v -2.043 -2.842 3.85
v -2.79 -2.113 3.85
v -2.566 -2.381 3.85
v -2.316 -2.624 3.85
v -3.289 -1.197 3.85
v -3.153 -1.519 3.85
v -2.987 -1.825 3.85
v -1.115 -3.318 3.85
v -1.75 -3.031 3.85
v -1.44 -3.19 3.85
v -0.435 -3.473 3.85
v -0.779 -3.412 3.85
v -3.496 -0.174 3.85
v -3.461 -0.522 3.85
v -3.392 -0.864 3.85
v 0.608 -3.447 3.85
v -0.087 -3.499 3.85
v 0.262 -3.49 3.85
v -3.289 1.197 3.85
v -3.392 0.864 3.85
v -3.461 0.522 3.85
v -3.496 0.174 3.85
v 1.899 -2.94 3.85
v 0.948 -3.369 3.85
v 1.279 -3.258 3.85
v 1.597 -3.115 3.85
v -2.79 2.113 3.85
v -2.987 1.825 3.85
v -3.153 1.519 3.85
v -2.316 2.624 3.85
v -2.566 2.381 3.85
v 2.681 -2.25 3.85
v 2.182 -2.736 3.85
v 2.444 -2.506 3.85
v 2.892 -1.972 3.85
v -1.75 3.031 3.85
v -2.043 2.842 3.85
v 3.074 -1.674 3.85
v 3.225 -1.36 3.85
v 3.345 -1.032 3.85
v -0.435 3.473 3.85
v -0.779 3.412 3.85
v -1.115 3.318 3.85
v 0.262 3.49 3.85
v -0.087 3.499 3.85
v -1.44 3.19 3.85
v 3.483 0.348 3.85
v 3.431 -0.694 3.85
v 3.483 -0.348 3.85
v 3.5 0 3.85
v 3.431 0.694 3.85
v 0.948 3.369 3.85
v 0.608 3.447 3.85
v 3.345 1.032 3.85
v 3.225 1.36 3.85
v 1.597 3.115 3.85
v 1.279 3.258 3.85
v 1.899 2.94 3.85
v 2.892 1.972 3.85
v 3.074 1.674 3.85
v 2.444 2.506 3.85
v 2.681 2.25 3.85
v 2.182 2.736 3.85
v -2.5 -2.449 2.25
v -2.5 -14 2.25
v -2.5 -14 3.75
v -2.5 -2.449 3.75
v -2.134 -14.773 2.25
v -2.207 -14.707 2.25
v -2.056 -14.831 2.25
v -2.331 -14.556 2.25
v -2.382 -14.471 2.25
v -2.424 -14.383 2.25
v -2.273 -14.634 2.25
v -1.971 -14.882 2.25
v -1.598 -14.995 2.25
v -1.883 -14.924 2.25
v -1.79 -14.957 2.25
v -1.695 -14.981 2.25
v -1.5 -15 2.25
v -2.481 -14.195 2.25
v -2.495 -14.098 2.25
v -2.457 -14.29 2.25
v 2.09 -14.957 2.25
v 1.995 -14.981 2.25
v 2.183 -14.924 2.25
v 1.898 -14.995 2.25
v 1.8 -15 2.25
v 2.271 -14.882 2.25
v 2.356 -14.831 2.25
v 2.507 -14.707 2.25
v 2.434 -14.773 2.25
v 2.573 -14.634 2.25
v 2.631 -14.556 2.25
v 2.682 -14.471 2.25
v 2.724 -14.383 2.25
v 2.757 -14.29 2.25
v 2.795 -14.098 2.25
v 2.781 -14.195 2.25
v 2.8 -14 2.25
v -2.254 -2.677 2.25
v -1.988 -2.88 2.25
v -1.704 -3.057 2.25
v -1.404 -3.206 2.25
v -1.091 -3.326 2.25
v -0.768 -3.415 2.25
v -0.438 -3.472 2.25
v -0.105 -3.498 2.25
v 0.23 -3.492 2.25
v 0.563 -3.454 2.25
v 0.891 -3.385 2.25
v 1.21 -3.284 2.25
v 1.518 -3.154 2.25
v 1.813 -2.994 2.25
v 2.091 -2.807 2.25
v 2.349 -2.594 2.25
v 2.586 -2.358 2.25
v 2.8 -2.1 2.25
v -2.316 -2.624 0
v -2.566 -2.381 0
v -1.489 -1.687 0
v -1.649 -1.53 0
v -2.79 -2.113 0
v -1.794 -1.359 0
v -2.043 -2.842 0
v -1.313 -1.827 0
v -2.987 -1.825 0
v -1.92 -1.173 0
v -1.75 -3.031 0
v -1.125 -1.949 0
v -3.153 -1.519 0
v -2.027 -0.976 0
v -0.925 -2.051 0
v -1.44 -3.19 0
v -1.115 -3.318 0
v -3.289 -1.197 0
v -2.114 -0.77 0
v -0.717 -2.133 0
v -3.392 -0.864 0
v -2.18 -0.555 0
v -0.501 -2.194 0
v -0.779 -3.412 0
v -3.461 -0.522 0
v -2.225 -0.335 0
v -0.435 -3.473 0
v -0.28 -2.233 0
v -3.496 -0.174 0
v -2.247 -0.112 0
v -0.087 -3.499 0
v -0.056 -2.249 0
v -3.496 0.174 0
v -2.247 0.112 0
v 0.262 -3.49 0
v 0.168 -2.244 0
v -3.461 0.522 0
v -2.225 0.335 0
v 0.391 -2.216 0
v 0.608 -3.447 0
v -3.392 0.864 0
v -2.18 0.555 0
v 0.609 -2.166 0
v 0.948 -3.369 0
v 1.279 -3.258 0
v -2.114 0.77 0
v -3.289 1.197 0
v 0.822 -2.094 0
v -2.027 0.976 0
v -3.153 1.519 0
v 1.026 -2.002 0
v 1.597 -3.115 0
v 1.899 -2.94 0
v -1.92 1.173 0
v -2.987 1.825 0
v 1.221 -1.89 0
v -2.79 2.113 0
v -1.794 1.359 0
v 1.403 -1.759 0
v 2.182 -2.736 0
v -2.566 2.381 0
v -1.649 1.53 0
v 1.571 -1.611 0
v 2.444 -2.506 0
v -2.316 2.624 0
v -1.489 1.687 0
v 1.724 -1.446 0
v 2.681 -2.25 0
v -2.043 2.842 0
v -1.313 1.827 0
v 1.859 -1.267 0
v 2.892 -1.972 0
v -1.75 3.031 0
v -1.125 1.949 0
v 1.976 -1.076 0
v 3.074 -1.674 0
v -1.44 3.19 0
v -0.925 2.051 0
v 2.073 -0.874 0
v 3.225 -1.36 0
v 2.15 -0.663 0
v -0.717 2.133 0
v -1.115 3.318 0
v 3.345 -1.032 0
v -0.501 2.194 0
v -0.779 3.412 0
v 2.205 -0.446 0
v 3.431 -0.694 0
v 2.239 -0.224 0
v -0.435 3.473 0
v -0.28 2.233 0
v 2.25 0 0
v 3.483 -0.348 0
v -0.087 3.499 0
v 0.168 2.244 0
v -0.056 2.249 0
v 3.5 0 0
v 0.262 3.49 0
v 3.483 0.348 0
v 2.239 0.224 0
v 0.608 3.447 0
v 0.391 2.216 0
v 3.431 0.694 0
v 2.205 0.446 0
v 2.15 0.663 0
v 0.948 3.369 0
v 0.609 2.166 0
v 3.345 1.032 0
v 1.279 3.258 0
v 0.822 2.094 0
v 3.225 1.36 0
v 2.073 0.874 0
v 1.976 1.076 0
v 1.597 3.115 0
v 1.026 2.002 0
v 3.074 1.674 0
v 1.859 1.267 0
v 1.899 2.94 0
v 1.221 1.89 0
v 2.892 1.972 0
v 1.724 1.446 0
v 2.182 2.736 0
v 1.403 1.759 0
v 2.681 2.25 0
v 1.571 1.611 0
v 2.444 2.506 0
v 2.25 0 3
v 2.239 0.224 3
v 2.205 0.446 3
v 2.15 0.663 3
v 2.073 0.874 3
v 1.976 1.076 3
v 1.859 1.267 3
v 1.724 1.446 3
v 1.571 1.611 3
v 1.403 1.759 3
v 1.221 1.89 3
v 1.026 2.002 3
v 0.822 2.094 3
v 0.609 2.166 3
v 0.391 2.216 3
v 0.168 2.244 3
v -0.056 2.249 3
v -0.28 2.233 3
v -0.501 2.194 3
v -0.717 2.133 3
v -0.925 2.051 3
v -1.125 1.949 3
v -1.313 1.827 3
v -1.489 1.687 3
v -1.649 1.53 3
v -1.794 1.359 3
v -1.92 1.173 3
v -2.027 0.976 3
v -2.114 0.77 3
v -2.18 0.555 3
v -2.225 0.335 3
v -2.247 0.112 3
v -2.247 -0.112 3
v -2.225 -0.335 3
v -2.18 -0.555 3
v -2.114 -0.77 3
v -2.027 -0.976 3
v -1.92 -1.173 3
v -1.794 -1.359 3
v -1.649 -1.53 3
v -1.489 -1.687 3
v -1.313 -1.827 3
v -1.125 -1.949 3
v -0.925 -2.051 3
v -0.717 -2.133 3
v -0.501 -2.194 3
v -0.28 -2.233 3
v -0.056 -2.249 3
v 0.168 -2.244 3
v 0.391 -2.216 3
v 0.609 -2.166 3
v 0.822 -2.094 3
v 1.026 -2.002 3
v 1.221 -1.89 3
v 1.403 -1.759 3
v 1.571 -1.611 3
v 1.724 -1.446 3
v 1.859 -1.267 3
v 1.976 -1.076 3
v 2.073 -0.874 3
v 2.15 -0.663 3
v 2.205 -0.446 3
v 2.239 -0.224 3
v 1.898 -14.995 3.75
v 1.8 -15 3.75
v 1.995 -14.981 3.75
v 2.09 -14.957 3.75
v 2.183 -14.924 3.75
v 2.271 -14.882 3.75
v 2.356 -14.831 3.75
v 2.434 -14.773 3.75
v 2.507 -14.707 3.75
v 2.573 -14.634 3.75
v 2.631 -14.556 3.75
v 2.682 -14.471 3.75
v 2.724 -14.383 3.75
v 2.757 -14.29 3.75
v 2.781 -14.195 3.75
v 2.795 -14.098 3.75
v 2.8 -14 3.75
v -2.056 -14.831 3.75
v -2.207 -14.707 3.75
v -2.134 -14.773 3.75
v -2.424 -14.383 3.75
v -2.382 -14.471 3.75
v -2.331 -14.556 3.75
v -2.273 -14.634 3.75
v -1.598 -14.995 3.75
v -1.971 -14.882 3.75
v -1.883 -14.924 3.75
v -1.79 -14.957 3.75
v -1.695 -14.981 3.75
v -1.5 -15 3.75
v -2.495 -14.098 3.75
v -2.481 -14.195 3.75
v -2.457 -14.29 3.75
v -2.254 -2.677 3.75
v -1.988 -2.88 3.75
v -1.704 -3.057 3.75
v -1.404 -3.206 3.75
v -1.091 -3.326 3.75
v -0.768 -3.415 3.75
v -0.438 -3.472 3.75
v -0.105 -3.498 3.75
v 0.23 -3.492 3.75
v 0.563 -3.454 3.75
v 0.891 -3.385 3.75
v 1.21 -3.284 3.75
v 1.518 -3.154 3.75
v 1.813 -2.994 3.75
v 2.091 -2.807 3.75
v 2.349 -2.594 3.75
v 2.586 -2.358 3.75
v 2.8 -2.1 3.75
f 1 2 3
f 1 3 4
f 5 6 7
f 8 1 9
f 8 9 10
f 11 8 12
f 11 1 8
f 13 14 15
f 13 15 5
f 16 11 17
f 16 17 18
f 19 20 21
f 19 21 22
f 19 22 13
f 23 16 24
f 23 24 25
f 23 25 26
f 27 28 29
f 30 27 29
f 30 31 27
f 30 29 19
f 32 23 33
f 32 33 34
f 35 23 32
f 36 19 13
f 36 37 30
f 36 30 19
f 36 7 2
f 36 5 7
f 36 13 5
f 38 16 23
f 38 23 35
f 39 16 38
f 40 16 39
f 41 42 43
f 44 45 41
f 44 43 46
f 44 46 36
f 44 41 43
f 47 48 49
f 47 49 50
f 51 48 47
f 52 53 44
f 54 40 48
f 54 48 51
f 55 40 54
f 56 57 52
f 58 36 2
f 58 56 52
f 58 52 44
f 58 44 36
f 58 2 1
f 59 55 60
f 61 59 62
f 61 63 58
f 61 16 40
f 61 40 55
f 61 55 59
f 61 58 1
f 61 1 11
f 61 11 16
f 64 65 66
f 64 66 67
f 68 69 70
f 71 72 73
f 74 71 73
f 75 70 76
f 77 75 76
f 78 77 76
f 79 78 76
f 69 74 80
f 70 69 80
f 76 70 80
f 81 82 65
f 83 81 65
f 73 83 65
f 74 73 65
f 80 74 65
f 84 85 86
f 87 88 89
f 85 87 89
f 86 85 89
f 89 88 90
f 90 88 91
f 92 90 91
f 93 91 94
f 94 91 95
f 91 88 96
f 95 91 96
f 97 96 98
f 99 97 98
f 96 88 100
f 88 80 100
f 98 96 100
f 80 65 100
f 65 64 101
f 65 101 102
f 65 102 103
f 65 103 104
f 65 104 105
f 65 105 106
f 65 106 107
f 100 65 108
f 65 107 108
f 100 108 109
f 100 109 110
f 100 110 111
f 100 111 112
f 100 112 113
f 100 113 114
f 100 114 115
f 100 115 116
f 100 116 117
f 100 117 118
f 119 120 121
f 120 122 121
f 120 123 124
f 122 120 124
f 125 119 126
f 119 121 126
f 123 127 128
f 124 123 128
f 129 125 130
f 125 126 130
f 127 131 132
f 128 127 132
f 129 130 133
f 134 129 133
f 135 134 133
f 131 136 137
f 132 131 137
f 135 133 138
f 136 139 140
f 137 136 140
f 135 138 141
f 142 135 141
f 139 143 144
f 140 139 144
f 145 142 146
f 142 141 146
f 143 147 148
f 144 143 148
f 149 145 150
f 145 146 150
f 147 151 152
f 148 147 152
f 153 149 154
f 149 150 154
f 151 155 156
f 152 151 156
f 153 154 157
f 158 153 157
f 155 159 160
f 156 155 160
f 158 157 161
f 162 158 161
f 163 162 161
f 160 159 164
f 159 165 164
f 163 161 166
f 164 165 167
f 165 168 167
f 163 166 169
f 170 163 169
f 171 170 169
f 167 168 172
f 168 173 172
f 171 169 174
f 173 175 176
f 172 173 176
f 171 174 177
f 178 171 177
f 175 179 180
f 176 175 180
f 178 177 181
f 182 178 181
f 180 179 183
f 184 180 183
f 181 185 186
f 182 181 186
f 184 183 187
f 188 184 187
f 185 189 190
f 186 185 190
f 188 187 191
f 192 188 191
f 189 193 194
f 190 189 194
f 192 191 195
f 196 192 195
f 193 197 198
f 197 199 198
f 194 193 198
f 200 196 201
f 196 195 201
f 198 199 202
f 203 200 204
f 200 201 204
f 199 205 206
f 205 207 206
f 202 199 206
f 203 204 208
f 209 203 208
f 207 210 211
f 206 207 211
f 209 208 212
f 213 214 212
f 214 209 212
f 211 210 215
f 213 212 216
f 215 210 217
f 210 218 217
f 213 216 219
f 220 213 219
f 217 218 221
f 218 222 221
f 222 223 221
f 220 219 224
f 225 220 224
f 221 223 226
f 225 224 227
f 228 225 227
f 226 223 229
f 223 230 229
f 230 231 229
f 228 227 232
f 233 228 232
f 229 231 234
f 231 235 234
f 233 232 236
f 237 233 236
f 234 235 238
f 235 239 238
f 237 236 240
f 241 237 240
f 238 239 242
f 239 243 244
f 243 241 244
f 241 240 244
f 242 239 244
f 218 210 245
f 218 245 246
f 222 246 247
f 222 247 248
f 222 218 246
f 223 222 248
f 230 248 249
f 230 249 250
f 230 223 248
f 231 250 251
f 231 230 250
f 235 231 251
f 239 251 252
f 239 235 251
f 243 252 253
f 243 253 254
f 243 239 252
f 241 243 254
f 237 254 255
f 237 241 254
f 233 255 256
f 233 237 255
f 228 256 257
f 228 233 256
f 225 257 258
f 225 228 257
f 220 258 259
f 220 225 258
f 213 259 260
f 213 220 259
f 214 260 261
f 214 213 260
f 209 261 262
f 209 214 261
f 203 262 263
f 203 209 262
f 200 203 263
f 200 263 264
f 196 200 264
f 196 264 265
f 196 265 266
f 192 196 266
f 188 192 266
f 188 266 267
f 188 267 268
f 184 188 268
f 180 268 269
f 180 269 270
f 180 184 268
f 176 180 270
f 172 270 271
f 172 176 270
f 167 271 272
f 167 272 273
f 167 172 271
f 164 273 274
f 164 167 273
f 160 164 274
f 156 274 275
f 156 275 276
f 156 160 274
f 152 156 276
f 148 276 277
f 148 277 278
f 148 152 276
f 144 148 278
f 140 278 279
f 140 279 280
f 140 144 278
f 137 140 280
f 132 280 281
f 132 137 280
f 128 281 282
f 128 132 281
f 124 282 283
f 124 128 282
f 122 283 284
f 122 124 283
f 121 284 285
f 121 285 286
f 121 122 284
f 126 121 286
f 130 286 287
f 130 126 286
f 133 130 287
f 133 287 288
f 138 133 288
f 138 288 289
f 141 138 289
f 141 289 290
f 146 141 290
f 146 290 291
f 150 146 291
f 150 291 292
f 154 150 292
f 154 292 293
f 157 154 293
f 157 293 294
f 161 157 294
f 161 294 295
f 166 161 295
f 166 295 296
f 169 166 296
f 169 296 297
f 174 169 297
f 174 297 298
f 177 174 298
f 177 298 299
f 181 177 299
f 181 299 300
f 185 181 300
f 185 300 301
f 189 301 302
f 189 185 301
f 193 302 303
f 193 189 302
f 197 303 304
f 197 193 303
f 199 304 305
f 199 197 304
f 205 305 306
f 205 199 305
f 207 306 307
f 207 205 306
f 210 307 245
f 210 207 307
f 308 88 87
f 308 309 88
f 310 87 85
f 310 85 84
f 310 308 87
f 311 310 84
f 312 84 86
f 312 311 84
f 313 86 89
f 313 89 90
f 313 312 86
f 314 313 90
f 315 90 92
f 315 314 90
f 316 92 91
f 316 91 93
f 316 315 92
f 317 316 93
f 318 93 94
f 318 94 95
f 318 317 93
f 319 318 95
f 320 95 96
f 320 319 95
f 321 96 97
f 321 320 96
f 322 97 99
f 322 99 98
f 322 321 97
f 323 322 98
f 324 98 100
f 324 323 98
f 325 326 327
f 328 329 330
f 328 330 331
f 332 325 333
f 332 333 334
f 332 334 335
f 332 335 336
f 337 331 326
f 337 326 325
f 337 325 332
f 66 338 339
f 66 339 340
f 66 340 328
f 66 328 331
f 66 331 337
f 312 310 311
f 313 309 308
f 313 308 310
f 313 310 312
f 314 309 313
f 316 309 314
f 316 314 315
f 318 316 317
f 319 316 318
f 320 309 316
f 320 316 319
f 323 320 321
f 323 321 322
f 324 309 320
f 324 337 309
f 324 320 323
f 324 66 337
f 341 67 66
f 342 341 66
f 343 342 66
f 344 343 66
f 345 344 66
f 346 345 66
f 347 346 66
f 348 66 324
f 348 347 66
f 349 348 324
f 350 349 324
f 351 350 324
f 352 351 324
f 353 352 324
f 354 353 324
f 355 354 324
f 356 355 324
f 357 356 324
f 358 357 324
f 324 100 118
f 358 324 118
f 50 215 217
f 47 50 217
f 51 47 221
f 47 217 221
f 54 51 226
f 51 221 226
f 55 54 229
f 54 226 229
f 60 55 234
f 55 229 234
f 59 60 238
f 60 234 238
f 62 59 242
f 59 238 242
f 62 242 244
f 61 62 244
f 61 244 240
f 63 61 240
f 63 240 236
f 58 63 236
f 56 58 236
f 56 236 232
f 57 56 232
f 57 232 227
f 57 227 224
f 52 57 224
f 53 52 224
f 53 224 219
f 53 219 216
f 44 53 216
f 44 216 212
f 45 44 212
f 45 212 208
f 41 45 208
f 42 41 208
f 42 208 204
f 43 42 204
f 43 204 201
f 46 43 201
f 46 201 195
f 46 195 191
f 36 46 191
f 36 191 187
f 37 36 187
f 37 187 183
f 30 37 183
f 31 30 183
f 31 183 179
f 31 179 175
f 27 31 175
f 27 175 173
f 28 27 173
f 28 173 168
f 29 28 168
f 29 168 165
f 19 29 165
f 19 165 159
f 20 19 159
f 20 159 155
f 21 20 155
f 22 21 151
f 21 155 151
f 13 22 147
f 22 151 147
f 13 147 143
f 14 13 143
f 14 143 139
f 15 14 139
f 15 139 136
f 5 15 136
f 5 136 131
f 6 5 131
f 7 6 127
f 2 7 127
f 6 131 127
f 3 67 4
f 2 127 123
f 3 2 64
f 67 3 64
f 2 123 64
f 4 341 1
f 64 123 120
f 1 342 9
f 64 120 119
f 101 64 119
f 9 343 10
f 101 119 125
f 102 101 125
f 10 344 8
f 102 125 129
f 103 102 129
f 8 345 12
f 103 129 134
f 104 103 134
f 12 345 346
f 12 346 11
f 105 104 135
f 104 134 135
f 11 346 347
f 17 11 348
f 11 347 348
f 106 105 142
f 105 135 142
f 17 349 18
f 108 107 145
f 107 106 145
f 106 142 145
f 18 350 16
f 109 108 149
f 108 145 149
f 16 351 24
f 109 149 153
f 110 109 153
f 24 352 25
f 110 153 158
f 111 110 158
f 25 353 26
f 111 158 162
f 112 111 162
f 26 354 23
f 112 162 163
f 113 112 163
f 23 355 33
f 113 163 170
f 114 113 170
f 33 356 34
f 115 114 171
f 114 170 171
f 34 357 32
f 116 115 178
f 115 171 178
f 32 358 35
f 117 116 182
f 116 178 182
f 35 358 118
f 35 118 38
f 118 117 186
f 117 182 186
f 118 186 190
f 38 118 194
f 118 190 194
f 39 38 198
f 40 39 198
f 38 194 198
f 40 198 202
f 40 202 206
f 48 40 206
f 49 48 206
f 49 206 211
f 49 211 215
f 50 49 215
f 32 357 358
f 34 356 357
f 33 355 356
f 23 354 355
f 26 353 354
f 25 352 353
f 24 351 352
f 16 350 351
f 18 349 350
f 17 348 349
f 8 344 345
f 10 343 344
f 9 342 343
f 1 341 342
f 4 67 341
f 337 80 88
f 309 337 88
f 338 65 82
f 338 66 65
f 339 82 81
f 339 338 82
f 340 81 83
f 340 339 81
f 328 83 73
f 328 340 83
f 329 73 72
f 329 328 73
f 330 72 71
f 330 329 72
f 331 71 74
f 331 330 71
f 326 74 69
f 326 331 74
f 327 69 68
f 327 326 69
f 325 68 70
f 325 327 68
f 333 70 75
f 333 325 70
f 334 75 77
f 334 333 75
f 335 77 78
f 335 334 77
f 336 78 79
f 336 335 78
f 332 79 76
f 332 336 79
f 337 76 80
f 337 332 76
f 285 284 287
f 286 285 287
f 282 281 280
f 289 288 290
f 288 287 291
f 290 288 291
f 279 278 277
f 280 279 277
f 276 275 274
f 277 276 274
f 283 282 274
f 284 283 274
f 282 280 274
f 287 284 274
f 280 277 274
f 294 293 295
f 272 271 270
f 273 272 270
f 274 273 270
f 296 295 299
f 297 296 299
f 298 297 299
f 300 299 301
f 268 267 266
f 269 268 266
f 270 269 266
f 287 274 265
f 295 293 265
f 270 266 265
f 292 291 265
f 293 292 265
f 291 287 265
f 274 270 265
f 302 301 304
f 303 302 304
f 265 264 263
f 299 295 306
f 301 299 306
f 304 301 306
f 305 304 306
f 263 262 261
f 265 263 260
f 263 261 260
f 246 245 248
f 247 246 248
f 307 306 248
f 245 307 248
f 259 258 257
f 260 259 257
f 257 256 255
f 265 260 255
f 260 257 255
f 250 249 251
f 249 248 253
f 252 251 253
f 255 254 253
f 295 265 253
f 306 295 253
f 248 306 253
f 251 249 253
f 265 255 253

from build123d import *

# Parameters (mm, degrees)
CYLINDER006_R     = 2.25
CYLINDER006_DEPTH = 3
BOX001_W          = 5.3
BOX001_H          = 13.5
BOX001_DEPTH      = 1.5
FILLET_R          = 1
CYLINDER005_R     = 3.5
CYLINDER005_DEPTH = 3.85


with BuildPart() as cylinder006:
    # Cylinder006 → Cylinder006 (new body)
    with BuildSketch(Plane.XY):
        Circle(CYLINDER006_R)
    extrude(amount=CYLINDER006_DEPTH)


with BuildPart() as fillet_body:
    # Box001 → Box001 (new body)
    with BuildSketch(Plane(origin=(-2.5, -15, 2.25), x_dir=(1, 0, 0), z_dir=(0, 0, 1))):
        with Locations((2.65, 6.75)):
            Rectangle(BOX001_W, BOX001_H)
    extrude(amount=BOX001_DEPTH)

    # Fillet
    fillet_edges = [fillet_body.edges().sort_by_distance(p)[0] for p in [
        (-2.5, -15, 3),
        (2.8, -15, 3),
    ]]
    fillet(fillet_edges, radius=FILLET_R)


with BuildPart() as servoarmsingle:
    # Cylinder005 → Cylinder005 (new body)
    with BuildSketch(Plane.XY):
        Circle(CYLINDER005_R)
    extrude(amount=CYLINDER005_DEPTH)

    # Fusion003: union Fillet body
    add(fillet_body.part)

    # Cut001: cut Cylinder006
    add(cylinder006.part, mode=Mode.SUBTRACT)


solid = servoarmsingle.part
